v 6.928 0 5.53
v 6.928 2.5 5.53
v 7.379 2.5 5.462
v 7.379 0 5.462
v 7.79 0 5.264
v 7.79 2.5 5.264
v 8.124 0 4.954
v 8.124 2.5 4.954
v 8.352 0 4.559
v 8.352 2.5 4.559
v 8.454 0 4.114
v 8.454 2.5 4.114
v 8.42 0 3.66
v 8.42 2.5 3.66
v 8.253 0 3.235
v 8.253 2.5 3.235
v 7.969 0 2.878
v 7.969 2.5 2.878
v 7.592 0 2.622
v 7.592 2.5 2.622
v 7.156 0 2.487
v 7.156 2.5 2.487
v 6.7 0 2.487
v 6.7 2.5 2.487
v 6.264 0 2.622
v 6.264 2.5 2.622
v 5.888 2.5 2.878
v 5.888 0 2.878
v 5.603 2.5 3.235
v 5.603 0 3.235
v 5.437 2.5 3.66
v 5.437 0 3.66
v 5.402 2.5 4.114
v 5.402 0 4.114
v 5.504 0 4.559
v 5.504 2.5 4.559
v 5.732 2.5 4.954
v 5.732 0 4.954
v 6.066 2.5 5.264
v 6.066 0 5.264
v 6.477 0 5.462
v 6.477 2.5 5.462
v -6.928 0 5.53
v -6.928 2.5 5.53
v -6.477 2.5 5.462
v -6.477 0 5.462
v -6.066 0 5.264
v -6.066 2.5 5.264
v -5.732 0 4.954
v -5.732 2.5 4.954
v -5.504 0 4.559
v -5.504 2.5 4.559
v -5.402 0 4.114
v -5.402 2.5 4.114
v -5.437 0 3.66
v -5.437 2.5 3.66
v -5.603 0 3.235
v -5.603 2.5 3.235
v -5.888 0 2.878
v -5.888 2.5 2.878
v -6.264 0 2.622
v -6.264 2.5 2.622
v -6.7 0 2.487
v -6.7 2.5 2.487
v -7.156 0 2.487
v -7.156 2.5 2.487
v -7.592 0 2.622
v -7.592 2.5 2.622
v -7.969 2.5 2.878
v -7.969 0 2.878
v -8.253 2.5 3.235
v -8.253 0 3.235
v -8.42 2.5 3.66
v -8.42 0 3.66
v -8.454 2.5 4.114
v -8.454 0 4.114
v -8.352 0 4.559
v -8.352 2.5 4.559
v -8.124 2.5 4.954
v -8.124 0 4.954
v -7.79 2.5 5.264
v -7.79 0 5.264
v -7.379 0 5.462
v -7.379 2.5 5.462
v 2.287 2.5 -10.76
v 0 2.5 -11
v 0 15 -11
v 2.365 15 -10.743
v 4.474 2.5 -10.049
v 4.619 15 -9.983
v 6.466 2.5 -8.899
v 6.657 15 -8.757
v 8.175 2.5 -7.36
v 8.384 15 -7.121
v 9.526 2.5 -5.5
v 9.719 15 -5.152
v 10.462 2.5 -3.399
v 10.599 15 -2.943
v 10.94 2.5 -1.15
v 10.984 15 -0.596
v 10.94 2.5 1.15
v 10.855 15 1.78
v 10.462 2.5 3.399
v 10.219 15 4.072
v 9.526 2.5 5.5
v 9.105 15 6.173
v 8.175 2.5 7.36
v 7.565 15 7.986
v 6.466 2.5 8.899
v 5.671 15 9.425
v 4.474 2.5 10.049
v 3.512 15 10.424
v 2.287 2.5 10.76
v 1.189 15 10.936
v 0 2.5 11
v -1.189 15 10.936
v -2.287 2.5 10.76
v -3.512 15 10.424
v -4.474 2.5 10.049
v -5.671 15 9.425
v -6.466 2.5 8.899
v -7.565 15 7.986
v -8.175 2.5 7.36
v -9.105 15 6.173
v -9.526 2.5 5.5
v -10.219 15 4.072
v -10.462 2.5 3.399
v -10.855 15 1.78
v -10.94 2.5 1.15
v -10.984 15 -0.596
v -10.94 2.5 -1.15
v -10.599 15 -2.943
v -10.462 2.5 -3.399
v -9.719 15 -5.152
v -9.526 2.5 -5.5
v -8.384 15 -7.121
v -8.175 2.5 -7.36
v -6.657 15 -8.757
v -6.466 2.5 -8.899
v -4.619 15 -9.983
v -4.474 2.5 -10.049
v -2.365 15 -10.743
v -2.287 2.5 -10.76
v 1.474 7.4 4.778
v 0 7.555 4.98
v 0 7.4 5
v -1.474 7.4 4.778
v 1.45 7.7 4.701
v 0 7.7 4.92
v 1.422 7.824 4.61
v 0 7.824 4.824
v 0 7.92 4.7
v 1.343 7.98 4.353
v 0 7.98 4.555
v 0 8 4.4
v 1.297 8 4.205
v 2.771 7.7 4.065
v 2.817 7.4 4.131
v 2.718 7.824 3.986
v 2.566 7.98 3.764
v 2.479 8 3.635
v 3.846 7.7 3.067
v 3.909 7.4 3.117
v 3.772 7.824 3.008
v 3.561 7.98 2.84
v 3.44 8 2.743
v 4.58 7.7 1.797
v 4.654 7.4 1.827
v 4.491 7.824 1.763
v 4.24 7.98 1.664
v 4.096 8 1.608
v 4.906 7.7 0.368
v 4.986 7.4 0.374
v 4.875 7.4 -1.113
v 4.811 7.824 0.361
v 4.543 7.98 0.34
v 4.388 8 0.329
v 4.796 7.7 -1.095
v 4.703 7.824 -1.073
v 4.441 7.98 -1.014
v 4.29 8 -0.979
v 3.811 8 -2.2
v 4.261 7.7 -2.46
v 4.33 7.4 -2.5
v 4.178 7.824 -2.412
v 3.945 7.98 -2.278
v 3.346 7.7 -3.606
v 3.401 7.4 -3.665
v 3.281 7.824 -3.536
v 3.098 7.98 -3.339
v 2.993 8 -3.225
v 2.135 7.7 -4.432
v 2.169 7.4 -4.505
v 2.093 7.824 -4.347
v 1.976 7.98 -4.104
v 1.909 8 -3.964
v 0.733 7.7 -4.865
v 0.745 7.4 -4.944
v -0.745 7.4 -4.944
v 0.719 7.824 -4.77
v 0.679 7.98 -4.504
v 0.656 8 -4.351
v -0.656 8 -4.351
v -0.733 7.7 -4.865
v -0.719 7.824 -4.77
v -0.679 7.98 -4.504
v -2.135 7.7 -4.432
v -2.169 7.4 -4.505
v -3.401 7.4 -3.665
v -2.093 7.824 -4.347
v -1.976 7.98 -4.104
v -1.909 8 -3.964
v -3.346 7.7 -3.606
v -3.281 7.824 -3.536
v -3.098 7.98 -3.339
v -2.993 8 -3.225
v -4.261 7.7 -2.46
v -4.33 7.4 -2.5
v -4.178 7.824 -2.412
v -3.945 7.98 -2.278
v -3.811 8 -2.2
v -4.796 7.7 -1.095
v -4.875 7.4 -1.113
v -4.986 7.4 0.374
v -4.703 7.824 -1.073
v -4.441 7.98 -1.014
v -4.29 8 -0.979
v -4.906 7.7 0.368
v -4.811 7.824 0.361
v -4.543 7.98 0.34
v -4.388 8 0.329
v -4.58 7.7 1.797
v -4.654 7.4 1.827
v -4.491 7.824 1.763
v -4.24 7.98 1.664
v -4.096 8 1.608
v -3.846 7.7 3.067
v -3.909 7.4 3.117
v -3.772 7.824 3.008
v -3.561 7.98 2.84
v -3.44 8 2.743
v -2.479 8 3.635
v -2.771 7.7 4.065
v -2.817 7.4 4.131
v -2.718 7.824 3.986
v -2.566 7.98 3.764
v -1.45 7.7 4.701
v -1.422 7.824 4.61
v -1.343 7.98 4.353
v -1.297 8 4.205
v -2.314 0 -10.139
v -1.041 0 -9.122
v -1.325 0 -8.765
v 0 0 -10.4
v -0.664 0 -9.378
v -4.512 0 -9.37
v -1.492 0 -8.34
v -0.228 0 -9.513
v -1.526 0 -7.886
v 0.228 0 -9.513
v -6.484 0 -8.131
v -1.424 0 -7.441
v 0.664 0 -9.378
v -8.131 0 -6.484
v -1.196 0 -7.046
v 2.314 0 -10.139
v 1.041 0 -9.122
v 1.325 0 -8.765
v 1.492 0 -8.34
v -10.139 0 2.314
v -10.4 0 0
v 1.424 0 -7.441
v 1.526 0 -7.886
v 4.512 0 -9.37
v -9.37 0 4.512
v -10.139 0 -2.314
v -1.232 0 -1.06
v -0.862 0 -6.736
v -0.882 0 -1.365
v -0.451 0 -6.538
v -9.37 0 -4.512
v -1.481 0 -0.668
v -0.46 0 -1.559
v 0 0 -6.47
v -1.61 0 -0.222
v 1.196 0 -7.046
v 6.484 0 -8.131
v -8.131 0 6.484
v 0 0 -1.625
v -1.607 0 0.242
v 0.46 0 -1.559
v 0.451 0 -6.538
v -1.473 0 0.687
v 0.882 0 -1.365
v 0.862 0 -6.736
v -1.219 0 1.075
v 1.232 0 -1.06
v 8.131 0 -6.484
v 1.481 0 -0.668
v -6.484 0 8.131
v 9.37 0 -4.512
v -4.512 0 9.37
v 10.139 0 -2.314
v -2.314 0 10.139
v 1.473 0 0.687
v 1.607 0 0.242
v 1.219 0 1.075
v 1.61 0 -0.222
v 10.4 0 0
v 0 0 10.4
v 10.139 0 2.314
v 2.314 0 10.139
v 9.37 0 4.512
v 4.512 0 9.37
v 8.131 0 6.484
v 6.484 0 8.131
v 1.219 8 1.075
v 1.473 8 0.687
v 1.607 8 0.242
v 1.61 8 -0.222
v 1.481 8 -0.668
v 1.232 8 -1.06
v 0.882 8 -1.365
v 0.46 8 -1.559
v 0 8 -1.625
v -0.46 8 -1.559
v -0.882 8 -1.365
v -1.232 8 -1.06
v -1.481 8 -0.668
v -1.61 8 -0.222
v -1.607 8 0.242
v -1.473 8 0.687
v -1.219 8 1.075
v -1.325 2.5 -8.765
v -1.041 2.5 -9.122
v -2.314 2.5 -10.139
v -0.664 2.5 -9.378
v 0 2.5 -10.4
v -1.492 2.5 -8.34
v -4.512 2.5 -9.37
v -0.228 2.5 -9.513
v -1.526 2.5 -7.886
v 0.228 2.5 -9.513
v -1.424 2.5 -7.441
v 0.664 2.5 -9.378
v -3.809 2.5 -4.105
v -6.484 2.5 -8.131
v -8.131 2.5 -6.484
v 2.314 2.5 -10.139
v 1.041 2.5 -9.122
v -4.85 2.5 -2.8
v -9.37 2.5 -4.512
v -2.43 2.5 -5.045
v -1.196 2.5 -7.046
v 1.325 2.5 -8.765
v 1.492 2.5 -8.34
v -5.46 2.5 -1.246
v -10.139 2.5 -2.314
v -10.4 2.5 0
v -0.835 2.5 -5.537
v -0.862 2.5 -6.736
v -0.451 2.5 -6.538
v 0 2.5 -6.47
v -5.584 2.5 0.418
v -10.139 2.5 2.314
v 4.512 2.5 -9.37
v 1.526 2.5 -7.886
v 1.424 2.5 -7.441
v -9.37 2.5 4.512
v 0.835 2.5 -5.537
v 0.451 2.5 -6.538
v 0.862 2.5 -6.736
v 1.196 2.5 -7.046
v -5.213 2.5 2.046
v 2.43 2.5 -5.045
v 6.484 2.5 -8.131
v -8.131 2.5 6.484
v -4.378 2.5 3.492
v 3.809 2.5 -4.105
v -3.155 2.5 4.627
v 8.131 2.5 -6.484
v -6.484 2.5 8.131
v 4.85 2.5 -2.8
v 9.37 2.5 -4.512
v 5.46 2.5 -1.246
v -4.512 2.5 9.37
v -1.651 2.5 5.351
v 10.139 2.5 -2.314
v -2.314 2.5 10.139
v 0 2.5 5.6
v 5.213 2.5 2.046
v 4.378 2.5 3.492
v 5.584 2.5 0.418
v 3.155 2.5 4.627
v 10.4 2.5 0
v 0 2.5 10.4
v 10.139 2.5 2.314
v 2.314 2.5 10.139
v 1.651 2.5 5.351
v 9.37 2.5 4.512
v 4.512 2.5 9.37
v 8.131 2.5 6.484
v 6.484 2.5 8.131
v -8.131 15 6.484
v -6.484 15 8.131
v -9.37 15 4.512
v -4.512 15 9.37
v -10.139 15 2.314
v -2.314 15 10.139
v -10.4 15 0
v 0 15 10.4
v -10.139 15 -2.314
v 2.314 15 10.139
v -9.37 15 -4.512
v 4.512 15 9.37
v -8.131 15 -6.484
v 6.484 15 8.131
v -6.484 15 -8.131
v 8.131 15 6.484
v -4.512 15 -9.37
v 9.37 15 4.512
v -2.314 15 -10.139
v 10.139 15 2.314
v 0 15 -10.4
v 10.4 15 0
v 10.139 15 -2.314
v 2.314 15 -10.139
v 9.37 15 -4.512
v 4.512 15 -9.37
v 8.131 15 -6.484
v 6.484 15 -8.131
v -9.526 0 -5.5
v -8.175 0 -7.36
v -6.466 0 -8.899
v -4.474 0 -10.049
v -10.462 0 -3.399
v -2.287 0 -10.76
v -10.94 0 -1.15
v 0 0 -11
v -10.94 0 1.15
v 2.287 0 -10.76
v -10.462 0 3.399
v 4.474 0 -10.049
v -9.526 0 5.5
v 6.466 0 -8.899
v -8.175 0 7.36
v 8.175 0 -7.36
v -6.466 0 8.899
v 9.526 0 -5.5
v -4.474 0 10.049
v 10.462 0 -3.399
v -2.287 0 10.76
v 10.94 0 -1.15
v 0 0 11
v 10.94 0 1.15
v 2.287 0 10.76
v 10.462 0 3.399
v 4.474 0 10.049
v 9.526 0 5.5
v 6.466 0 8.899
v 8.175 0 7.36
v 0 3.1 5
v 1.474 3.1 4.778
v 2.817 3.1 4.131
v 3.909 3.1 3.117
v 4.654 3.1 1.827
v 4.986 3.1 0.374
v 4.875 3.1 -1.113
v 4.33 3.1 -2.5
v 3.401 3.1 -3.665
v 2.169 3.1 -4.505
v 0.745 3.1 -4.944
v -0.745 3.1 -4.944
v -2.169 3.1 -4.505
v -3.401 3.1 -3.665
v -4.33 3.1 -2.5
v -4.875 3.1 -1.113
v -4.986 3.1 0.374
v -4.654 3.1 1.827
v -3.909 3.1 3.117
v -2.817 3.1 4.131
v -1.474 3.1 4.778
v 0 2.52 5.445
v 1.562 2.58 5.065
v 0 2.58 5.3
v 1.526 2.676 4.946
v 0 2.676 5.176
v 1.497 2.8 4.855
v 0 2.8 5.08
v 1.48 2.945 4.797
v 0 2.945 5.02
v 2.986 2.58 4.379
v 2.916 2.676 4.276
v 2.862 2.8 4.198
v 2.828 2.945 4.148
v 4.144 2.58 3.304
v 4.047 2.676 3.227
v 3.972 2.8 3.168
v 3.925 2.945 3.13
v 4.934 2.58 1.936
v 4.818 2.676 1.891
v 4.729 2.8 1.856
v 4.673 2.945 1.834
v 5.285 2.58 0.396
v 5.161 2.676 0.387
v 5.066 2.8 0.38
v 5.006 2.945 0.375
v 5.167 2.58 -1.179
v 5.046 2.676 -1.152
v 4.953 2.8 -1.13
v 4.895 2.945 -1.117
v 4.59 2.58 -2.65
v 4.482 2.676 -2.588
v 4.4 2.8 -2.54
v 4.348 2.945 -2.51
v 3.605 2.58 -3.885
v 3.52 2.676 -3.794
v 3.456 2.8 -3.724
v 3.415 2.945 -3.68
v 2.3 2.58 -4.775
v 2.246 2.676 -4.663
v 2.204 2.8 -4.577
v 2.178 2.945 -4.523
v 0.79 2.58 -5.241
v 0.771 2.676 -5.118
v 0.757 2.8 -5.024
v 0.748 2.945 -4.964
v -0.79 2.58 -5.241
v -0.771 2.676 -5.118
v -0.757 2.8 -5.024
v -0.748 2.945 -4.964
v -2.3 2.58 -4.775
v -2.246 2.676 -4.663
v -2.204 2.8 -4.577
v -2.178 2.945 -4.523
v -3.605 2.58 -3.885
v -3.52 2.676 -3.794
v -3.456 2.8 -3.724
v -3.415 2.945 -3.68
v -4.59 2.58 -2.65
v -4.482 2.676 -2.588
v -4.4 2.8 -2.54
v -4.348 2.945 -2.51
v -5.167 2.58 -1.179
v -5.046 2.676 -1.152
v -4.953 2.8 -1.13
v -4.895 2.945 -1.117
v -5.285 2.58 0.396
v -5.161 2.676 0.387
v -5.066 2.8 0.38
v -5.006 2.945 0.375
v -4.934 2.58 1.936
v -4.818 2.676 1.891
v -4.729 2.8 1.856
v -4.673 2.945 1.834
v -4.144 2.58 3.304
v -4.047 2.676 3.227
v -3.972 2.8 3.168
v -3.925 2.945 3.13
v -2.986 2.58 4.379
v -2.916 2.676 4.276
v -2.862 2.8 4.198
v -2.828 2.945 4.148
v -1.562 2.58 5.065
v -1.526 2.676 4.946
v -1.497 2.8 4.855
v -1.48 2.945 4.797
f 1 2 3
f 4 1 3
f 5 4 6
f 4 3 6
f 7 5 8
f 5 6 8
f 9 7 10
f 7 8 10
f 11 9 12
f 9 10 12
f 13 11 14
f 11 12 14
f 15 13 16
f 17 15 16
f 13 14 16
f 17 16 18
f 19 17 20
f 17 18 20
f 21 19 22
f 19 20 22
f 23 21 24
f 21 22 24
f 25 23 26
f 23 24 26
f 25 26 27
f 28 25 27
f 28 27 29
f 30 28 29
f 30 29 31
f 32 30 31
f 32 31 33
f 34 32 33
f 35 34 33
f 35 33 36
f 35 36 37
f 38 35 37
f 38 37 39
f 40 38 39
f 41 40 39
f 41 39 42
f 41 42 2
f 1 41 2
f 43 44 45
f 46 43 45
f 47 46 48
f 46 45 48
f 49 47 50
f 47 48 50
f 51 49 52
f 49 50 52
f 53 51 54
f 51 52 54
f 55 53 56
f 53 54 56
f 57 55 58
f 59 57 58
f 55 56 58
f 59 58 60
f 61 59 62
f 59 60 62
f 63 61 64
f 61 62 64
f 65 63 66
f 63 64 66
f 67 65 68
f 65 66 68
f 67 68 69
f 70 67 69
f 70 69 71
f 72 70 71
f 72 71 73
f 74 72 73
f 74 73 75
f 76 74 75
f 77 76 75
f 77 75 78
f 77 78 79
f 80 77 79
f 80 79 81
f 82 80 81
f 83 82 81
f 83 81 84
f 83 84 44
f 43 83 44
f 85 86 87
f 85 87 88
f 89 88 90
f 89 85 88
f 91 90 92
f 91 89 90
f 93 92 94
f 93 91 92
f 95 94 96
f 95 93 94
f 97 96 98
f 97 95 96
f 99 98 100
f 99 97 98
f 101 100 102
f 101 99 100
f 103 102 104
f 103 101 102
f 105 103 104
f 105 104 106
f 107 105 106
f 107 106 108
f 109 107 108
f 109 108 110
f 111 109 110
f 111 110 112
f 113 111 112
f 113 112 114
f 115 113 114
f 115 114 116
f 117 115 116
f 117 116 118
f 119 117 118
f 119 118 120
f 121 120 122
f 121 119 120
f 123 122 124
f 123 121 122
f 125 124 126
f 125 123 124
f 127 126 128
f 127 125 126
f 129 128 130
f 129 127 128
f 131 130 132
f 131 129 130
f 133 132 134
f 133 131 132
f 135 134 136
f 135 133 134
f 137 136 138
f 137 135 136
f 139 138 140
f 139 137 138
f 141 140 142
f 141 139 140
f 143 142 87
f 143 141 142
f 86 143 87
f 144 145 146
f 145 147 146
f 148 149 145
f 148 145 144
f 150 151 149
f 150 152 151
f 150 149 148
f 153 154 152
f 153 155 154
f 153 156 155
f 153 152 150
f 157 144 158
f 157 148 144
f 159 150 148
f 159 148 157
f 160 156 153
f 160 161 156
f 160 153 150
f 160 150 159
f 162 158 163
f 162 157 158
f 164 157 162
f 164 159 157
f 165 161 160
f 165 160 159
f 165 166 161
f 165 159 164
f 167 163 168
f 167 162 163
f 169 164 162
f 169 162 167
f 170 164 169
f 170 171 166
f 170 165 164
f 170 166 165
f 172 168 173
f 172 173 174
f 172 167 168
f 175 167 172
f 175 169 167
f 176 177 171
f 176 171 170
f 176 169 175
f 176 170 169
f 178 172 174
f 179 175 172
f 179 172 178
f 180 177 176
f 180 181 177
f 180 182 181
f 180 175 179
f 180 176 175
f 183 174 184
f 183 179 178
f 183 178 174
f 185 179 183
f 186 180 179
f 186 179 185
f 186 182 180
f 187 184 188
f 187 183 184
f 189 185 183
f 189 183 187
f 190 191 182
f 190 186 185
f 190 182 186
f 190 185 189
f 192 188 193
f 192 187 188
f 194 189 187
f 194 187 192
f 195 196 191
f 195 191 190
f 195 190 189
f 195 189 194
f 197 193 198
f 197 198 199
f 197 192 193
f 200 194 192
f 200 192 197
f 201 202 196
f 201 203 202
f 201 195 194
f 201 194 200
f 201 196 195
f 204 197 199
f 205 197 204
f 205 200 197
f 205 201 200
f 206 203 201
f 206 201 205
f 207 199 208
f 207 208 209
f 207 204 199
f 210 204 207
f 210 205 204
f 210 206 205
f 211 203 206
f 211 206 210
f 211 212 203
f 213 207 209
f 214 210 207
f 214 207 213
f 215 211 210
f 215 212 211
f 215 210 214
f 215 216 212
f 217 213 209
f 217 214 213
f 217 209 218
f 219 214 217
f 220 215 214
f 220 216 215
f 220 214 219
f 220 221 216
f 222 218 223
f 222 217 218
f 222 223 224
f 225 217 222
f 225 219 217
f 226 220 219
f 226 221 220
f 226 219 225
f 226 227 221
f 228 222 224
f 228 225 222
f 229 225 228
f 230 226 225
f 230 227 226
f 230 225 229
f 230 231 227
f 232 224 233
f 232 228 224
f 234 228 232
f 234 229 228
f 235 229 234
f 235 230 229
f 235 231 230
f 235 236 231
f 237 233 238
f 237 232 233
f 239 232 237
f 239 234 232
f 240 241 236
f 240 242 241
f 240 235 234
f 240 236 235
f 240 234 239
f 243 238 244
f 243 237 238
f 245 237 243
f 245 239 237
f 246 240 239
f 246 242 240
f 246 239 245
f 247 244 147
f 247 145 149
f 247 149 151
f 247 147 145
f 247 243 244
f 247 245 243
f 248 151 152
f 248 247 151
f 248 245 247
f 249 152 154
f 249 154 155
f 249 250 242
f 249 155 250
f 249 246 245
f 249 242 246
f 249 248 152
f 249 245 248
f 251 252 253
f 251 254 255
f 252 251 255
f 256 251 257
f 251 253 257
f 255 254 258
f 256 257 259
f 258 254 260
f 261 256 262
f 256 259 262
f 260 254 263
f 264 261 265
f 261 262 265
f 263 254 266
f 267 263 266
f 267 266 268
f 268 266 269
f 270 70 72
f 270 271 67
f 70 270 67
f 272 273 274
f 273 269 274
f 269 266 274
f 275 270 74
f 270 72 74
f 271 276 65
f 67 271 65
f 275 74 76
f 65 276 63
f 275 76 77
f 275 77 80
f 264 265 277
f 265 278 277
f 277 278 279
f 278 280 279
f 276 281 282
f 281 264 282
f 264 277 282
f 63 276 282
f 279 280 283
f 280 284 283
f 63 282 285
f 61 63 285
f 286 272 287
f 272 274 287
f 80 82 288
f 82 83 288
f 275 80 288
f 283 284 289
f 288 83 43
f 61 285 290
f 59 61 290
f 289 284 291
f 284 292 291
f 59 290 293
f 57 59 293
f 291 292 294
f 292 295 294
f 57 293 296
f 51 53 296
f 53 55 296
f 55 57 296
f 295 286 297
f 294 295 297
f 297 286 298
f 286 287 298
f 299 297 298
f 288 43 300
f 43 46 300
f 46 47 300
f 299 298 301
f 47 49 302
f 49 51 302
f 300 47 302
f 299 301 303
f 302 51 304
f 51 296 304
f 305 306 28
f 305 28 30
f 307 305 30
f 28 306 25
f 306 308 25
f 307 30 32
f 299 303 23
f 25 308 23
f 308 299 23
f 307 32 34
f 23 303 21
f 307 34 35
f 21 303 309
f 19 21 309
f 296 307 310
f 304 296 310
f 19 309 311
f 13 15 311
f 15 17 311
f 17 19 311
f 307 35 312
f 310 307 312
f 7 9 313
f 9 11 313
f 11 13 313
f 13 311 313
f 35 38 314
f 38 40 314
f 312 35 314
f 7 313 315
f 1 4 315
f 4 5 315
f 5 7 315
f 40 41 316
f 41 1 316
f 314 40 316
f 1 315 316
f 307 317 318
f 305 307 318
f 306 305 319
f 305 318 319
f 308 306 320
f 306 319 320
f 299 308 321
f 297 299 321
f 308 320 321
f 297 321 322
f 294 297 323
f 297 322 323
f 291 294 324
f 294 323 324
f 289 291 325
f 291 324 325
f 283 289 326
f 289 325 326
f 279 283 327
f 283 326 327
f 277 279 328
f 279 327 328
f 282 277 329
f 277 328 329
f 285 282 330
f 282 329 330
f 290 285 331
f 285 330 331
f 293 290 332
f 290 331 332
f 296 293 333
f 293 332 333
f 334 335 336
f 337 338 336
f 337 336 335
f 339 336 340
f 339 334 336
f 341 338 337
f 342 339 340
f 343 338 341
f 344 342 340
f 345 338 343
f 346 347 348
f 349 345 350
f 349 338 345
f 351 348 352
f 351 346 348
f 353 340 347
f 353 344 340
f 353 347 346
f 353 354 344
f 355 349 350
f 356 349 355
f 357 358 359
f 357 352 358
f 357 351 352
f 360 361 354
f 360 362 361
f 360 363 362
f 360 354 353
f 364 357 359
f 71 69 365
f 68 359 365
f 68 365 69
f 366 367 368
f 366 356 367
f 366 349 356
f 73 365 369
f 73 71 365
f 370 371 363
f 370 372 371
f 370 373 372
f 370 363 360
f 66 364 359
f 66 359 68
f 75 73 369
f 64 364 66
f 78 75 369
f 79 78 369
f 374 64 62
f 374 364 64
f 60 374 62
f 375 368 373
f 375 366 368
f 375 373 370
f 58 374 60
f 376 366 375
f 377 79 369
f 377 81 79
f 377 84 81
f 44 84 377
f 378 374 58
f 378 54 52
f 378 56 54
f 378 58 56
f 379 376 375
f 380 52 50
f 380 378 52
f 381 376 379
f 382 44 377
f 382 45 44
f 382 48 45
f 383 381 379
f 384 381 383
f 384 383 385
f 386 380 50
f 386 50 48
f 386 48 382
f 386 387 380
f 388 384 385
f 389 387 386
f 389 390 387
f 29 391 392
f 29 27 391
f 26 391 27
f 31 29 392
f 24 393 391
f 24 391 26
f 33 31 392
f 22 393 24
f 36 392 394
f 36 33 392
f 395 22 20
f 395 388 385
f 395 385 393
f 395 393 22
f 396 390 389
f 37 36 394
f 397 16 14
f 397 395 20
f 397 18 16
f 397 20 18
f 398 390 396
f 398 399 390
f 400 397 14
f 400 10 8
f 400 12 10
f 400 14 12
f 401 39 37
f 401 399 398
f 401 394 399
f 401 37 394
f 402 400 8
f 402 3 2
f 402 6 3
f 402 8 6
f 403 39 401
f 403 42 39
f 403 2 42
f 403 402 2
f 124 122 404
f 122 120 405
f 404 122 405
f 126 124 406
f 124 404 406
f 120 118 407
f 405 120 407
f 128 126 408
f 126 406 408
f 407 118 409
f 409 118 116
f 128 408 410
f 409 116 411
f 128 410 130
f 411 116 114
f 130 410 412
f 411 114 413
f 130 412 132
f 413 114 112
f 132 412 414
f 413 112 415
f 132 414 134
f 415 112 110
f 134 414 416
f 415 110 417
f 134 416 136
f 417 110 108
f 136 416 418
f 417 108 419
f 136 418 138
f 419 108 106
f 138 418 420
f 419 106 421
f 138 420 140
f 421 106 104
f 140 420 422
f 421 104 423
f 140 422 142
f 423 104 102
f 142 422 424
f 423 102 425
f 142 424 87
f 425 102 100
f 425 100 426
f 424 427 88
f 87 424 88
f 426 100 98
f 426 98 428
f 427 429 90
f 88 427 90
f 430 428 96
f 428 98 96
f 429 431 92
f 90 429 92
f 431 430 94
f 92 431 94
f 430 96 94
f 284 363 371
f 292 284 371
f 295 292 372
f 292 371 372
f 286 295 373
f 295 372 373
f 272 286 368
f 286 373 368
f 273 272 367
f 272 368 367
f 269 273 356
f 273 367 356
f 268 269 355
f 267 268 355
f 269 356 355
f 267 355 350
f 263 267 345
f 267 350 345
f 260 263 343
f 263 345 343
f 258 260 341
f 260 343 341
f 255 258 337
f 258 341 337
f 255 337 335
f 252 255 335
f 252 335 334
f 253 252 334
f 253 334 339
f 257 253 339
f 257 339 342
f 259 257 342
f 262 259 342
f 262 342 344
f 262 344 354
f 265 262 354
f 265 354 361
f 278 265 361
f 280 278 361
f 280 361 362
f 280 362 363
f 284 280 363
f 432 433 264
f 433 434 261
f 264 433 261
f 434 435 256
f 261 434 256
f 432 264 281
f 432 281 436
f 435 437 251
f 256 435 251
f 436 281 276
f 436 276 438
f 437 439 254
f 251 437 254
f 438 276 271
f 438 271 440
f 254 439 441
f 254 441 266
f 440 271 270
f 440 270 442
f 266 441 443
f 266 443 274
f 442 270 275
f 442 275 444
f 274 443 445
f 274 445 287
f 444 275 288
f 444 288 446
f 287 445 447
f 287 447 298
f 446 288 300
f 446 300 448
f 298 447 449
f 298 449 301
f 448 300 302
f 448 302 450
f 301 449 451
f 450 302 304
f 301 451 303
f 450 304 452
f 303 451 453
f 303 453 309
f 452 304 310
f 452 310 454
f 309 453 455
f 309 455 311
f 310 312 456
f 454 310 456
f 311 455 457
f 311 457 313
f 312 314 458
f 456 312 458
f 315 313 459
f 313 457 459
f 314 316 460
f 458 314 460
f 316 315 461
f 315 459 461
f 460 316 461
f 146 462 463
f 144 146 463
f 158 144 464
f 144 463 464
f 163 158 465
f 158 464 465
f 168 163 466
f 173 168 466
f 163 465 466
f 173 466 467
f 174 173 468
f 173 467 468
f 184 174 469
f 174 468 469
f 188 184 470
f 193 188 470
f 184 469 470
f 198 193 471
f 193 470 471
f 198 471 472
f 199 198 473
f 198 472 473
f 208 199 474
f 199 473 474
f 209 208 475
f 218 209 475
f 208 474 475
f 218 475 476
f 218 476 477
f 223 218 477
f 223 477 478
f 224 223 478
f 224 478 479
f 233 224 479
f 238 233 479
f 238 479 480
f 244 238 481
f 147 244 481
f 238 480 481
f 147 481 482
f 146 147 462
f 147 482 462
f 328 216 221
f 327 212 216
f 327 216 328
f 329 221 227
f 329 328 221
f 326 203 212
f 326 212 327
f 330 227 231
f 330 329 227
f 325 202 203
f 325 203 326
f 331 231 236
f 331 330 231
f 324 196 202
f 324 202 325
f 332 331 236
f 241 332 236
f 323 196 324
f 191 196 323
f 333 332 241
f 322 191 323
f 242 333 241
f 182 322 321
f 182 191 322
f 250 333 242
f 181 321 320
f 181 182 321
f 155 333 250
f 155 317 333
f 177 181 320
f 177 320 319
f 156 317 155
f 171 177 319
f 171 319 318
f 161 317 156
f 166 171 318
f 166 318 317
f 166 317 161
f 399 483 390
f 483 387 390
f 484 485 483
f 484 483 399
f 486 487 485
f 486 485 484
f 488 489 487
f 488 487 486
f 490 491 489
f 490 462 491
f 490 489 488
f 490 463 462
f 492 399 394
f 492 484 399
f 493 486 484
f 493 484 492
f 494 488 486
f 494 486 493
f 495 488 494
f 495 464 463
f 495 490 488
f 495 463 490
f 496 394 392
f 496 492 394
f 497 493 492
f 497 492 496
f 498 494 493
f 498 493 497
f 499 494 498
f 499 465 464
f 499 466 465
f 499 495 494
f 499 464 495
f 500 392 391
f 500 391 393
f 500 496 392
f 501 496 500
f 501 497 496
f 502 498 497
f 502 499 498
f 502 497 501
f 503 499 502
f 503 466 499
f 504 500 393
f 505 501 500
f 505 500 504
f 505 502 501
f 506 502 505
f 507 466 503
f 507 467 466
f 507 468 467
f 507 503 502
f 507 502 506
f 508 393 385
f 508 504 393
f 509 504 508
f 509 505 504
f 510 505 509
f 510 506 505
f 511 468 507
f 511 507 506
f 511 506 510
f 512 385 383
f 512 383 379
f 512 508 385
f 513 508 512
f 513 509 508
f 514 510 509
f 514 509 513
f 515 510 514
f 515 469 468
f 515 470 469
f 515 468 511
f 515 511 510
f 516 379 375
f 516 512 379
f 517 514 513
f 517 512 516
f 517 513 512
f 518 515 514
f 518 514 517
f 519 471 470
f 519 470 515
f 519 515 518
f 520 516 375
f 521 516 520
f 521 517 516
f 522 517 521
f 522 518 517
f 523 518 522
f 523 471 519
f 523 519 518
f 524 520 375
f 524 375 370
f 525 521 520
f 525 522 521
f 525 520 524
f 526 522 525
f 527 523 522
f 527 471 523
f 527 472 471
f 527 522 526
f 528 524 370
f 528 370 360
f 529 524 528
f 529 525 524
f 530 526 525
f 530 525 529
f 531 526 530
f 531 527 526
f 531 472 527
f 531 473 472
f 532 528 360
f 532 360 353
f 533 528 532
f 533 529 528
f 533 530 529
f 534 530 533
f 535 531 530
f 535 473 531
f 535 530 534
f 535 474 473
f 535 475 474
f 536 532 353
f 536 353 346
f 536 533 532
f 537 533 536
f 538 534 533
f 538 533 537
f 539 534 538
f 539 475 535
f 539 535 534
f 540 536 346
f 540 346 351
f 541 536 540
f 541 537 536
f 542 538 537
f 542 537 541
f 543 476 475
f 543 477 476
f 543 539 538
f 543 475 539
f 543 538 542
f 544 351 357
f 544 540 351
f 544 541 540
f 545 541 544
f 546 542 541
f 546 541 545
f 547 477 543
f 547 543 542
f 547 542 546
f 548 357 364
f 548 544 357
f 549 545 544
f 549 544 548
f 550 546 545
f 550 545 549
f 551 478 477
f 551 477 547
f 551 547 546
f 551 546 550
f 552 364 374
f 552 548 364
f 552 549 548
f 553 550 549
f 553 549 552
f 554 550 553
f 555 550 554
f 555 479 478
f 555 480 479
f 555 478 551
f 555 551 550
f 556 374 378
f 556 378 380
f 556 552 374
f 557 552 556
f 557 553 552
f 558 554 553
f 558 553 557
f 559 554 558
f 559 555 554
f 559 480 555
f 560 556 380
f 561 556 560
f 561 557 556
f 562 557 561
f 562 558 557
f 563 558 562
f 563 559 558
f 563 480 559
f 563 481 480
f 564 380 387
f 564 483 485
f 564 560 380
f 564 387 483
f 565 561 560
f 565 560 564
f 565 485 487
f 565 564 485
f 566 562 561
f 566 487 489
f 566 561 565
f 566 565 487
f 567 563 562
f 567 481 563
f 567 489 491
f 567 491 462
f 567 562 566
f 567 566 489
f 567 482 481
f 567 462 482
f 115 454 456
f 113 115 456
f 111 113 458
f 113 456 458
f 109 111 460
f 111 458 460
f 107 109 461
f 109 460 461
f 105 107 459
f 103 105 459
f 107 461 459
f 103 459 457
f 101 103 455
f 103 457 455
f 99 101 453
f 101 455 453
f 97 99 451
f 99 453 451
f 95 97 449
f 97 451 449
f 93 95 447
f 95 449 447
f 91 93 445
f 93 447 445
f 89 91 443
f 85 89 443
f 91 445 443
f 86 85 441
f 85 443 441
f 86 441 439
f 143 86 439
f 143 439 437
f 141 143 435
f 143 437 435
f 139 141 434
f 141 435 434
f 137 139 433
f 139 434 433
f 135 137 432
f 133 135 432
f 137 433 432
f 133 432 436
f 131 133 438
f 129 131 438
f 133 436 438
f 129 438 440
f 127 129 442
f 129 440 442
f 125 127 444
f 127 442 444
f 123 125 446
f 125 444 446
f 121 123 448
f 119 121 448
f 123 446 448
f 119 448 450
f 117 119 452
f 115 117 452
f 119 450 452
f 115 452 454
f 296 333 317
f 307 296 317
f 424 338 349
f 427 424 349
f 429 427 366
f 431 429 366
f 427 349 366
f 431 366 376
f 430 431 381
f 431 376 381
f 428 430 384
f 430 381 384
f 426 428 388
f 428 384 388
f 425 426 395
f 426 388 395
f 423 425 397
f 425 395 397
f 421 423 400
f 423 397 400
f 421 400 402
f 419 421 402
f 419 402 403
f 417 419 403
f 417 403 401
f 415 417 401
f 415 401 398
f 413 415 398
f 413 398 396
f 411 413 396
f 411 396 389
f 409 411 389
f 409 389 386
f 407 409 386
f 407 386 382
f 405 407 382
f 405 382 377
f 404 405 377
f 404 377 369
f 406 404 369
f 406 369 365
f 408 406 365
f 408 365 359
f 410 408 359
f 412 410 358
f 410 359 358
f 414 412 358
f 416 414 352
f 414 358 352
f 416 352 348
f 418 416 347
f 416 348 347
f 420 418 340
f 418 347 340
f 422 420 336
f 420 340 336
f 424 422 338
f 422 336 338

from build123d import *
from build123d.topology import SkipClean

# Parameters (mm, degrees)
SKETCH1_R           = 11
BOSS_EXTRUDE1_DEPTH = 2.5
SKETCH2_R           = 5
BOSS_EXTRUDE2_DEPTH = 5.5
SKETCH3_R           = 1.53
CUT_EXTRUDE1_DEPTH  = 17.5
CUT_EXTRUDE2_DEPTH  = 18.492855685
FILLET1_R           = 0.6
SKETCH5_R           = 11
SKETCH5_R_2         = 10.4
BOSS_EXTRUDE3_DEPTH = 15


with BuildPart() as part:
    # Sketch1 → Boss-Extrude1 (new body)
    with BuildSketch(Plane(origin=(0, 0, 0), x_dir=(1, 0, 0), z_dir=(0, 1, 0))):
        with Locations(Location((0, 0, 0), (0, 0, 270))):
            Circle(SKETCH1_R)
    extrude(amount=BOSS_EXTRUDE1_DEPTH)

    # Sketch2 → Boss-Extrude2 (add)
    with BuildSketch(Plane(origin=(0, 2.5, 0), x_dir=(1, 0, 0), z_dir=(0, 1, 0))):
        with Locations(Location((0, 0, 0), (0, 0, 270))):
            Circle(SKETCH2_R)
    extrude(amount=BOSS_EXTRUDE2_DEPTH)

    # Sketch3 → Cut-Extrude1 (cut, through all)
    with BuildSketch(Plane(origin=(0, 2.5, 0), x_dir=(1, 0, 0), z_dir=(0, 1, 0))):
        with Locations(Location((0, 8, 0), (0, 0, 270))):
            Circle(SKETCH3_R)
        with Locations(Location((6.92820323, -4, 0), (0, 0, 270))):
            Circle(SKETCH3_R)
        with Locations(Location((-6.92820323, -4, 0), (0, 0, 270))):
            Circle(SKETCH3_R)
    extrude(amount=-CUT_EXTRUDE1_DEPTH, mode=Mode.SUBTRACT)

    # Sketch4 → Cut-Extrude2 (cut, through all)
    with BuildSketch(Plane(origin=(0, 8, 0), x_dir=(1, 0, 0), z_dir=(0, 1, 0))):
        with BuildLine():
            Line((-1.218605761, -1.075), (1.218605761, -1.075))
            ThreePointArc((1.218605761, -1.075), (0, 1.625), (-1.218605761, -1.075))
        make_face()
    extrude(amount=-CUT_EXTRUDE2_DEPTH, mode=Mode.SUBTRACT)

    # Fillet1
    fillet1_edges = [part.edges().sort_by_distance(p)[0] for p in [
        (0, 2.5, -5),
        (0, 8, -5),
    ]]
    fillet(fillet1_edges, radius=FILLET1_R)

    # Sketch5 → Boss-Extrude3 (add)
    with SkipClean():  # the faces are left unmerged after this step: merging them gives an invalid solid
        with BuildSketch(Plane.XZ):
            with Locations(Location((0, 0, 0), (0, 0, 270))):
                Circle(SKETCH5_R)
            with Locations(Location((0, 0, 0), (0, 0, 270))):
                Circle(SKETCH5_R_2, mode=Mode.SUBTRACT)
        extrude(amount=-BOSS_EXTRUDE3_DEPTH)


solid = part.part
